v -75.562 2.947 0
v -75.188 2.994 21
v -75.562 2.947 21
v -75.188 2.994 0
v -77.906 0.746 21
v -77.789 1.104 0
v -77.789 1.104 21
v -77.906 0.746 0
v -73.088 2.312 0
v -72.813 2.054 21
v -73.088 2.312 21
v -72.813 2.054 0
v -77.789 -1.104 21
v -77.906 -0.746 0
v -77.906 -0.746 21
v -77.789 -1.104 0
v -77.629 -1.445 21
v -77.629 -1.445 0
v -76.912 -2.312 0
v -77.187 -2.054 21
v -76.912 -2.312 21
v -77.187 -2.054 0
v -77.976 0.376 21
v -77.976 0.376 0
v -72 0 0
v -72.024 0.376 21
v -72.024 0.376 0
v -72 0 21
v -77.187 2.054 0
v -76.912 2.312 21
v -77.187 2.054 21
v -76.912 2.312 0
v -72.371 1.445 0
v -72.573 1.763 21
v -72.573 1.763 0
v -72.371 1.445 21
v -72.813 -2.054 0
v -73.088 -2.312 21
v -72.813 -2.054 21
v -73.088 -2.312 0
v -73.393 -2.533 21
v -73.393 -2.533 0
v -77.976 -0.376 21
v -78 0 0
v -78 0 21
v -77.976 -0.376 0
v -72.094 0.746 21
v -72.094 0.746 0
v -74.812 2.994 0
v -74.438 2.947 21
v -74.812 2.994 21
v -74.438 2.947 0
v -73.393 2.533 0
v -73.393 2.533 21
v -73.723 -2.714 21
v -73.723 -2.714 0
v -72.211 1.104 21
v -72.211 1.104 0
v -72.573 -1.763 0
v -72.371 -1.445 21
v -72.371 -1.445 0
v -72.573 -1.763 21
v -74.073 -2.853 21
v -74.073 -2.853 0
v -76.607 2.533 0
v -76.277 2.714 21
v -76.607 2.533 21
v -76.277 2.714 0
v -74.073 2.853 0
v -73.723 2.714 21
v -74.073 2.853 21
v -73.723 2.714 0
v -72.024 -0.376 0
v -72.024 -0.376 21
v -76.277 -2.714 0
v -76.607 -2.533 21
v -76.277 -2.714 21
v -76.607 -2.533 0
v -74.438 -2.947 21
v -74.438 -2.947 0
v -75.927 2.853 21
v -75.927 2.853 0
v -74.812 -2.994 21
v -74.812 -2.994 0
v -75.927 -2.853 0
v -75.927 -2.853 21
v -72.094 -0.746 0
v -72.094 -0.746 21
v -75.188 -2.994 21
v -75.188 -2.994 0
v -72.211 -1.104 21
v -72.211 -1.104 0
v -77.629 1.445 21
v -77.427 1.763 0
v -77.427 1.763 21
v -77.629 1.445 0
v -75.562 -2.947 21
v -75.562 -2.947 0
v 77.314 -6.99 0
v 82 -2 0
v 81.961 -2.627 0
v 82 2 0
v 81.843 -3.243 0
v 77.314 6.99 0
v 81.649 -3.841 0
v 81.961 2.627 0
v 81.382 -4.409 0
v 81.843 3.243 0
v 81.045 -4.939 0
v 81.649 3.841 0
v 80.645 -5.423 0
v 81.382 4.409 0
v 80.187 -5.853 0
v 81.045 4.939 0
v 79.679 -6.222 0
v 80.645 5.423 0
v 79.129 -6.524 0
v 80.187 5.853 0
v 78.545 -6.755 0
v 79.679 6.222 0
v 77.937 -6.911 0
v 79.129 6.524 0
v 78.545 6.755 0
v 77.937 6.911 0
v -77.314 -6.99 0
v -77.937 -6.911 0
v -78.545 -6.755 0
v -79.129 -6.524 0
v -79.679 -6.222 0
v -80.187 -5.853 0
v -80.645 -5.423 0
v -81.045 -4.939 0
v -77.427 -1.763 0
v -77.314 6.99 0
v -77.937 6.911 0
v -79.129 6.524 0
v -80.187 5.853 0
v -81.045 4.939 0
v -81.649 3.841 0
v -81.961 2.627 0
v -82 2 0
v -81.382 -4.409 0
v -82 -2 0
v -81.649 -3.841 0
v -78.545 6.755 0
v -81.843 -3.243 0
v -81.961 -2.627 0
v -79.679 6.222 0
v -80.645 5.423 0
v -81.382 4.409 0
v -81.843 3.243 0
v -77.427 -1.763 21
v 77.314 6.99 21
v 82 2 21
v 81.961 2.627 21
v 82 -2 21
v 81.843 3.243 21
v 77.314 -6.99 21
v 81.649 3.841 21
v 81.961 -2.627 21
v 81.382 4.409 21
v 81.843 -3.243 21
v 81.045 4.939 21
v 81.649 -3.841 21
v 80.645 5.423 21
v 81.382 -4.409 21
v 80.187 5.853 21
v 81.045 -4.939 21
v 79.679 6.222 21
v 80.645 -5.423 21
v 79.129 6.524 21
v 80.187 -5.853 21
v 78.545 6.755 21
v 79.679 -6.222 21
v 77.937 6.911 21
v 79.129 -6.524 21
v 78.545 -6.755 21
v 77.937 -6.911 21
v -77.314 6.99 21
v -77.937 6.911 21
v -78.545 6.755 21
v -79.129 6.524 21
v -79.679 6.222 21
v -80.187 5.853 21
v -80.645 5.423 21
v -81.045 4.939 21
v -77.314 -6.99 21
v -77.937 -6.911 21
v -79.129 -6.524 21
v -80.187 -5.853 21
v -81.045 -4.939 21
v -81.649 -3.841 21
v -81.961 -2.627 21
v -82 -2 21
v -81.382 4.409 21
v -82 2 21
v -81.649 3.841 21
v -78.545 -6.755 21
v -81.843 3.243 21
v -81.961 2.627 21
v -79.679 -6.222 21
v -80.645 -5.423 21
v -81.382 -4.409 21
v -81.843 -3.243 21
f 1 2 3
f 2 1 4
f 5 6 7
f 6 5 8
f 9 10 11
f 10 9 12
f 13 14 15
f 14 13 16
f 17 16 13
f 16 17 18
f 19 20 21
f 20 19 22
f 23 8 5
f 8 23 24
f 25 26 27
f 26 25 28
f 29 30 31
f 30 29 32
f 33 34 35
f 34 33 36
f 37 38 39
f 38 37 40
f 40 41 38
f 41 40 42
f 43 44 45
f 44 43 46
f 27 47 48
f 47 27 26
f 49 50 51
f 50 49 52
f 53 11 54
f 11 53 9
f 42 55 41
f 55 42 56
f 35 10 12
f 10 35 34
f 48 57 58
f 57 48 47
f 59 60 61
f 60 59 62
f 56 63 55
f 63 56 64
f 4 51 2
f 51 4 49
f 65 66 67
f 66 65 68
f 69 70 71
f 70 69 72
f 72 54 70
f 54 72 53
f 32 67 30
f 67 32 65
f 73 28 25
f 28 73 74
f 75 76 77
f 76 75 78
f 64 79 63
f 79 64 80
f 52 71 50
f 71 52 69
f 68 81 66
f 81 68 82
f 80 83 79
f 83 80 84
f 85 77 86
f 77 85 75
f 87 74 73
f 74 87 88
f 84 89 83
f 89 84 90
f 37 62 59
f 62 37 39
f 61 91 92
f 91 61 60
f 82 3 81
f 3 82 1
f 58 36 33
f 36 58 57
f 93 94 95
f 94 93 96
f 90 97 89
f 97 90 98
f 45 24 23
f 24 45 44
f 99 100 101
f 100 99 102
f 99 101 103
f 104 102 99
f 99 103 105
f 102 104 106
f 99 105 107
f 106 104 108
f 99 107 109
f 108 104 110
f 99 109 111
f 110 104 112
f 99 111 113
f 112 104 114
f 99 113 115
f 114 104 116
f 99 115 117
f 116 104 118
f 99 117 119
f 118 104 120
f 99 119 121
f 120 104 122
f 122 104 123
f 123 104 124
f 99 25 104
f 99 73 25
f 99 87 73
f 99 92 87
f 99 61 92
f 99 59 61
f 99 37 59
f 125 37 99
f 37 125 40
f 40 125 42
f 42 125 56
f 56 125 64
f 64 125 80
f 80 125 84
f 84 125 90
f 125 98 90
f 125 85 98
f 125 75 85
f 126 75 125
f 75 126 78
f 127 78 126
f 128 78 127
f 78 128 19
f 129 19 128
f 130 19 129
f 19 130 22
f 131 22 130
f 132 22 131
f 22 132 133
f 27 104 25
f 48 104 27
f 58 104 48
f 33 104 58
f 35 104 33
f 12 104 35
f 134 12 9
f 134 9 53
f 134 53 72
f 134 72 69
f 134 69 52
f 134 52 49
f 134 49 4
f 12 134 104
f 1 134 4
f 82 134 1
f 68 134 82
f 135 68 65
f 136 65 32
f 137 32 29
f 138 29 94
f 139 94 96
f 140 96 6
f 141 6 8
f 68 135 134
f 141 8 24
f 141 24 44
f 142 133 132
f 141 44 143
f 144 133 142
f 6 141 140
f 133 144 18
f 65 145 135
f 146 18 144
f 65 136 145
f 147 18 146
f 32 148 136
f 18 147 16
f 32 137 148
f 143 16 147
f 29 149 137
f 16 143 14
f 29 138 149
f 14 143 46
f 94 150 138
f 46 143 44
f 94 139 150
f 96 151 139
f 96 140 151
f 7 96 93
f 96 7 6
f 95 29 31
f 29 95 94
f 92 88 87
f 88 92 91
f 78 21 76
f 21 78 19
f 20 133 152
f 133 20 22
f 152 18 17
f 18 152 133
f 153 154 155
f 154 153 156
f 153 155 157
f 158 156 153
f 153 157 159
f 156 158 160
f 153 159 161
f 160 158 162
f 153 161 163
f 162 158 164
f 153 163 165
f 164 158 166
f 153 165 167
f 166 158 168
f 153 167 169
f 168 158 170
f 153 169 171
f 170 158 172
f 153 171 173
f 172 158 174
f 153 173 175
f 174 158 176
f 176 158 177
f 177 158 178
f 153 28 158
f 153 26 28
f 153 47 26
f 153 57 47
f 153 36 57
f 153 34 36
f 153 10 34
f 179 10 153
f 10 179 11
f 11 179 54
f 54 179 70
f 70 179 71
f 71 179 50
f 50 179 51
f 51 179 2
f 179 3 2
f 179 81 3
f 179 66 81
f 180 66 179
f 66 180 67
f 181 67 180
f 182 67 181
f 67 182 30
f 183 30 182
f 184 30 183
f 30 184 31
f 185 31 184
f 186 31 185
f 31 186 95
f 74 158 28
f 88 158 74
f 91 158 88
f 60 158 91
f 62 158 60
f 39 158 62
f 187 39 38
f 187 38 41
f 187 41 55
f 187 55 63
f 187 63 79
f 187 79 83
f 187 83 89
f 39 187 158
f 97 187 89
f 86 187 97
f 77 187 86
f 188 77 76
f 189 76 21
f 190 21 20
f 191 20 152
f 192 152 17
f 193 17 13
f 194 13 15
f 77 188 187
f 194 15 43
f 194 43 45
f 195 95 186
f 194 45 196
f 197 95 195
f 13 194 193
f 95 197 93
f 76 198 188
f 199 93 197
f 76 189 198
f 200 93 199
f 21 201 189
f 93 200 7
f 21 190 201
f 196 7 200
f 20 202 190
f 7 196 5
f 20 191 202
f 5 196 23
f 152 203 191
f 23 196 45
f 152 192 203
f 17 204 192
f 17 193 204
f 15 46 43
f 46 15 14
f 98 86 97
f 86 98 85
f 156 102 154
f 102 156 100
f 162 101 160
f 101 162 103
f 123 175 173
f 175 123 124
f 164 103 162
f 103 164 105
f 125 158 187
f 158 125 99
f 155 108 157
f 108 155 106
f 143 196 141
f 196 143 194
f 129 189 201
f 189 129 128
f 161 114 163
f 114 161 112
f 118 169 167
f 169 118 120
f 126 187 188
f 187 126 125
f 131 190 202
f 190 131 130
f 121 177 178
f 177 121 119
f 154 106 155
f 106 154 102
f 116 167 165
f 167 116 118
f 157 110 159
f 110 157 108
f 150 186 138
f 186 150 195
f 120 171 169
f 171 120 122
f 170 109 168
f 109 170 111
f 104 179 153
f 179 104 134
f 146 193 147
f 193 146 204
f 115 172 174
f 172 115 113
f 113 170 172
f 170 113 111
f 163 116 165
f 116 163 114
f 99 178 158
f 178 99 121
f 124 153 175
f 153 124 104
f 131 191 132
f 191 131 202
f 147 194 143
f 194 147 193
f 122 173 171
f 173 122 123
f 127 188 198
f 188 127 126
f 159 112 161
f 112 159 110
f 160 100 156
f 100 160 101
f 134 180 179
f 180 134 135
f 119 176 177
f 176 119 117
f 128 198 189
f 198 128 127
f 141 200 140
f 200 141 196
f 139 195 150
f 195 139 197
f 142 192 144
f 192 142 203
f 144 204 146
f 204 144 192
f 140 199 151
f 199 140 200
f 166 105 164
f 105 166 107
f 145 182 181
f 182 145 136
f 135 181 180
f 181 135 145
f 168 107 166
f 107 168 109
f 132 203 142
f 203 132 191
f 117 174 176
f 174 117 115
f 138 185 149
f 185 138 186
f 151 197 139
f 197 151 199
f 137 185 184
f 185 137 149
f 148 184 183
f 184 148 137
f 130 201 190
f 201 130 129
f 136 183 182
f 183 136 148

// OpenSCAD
$fn = 50;


difference() {
	union() {
		hull() {
			translate(v = [-77.0000000000, 2.0000000000, 0]) {
				cylinder(h = 21, r = 5);
			}
			translate(v = [77.0000000000, 2.0000000000, 0]) {
				cylinder(h = 21, r = 5);
			}
			translate(v = [-77.0000000000, -2.0000000000, 0]) {
				cylinder(h = 21, r = 5);
			}
			translate(v = [77.0000000000, -2.0000000000, 0]) {
				cylinder(h = 21, r = 5);
			}
		}
	}
	union() {
		translate(v = [-75.0000000000, 0.0000000000, 0]) {
			cylinder(h = 21, r = 3.0000000000);
		}
		translate(v = [-75.0000000000, 0.0000000000, 0]) {
			cylinder(h = 21, r = 1.5000000000);
		}
		translate(v = [-75.0000000000, 0.0000000000, 0]) {
			cylinder(h = 21, r = 1.5000000000);
		}
		translate(v = [-75.0000000000, 0.0000000000, 0]) {
			cylinder(h = 21, r = 1.5000000000);
		}
	}
}
